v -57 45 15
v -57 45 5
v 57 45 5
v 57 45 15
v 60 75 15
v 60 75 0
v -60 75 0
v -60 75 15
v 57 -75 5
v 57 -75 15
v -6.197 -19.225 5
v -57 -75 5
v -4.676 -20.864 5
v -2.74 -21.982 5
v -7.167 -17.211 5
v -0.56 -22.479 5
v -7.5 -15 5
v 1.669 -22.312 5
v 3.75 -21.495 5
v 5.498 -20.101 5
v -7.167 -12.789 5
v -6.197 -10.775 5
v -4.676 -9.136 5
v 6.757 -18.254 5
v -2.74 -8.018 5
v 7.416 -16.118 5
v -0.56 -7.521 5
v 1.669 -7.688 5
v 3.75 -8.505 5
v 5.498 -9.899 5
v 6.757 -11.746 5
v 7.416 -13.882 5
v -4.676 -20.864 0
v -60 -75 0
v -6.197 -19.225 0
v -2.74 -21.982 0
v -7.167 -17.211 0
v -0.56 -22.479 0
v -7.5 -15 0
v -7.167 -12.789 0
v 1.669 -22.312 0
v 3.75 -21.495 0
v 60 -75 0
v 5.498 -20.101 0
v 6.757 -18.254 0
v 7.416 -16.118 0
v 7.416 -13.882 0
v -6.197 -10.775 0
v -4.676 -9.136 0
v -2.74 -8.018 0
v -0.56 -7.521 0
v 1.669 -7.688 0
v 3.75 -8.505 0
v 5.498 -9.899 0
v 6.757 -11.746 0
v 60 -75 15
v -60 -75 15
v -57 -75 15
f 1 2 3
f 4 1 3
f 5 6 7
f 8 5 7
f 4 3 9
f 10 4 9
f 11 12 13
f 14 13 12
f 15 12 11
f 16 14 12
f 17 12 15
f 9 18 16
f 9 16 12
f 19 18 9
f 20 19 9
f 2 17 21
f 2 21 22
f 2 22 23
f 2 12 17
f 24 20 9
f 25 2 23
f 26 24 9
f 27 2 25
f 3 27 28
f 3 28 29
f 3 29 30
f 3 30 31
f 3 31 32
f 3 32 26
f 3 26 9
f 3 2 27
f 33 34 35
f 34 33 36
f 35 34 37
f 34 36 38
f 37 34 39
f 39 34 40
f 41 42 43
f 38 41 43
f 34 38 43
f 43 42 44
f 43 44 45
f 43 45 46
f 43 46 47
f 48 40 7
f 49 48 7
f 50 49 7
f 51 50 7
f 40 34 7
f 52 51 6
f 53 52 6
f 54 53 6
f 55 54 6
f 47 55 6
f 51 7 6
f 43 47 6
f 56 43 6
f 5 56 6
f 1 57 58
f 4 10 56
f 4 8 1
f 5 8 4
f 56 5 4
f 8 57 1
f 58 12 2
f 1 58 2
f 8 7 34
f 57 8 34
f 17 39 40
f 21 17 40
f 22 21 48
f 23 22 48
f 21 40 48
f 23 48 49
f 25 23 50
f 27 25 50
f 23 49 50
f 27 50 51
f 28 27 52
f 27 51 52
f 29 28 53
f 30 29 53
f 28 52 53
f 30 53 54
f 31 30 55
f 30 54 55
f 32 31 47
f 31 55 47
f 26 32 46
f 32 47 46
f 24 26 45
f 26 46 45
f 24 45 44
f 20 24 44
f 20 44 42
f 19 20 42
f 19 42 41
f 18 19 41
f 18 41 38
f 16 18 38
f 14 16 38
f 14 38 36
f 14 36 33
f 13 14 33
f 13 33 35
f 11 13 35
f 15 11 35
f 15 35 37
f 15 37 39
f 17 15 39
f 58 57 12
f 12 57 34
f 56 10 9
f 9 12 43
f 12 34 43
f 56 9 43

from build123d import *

# Parameters (mm, degrees)
SKETCH1_W           = 120
SKETCH1_H           = 150
BOSS_EXTRUDE1_DEPTH = 5
BOSS_EXTRUDE2_DEPTH = 10
SKETCH4_R           = 7.5
CUT_EXTRUDE1_DEPTH  = 10


with BuildPart() as part:
    # Sketch1 → Boss-Extrude1 (new body)
    with BuildSketch(Plane.XY):
        Rectangle(SKETCH1_W, SKETCH1_H)
    extrude(amount=BOSS_EXTRUDE1_DEPTH)

    # Sketch3 → Boss-Extrude2 (add)
    with BuildSketch(Plane.XY.offset(5)):
        Polygon((-60, 45), (-60, -75), (-57, -75), (-57, 45), (57, 45), (57, -75), (60, -75), (60, 45), (60, 75), (-60, 75), align=None)
    extrude(amount=BOSS_EXTRUDE2_DEPTH)

    # Sketch4 → Cut-Extrude1 (cut)
    with BuildSketch(Plane(origin=(0, 0, 0), x_dir=(-1, 0, 0), z_dir=(0, 0, -1))):
        with Locations((0, -15)):
            Circle(SKETCH4_R)
    extrude(amount=-CUT_EXTRUDE1_DEPTH, mode=Mode.SUBTRACT)


solid = part.part
